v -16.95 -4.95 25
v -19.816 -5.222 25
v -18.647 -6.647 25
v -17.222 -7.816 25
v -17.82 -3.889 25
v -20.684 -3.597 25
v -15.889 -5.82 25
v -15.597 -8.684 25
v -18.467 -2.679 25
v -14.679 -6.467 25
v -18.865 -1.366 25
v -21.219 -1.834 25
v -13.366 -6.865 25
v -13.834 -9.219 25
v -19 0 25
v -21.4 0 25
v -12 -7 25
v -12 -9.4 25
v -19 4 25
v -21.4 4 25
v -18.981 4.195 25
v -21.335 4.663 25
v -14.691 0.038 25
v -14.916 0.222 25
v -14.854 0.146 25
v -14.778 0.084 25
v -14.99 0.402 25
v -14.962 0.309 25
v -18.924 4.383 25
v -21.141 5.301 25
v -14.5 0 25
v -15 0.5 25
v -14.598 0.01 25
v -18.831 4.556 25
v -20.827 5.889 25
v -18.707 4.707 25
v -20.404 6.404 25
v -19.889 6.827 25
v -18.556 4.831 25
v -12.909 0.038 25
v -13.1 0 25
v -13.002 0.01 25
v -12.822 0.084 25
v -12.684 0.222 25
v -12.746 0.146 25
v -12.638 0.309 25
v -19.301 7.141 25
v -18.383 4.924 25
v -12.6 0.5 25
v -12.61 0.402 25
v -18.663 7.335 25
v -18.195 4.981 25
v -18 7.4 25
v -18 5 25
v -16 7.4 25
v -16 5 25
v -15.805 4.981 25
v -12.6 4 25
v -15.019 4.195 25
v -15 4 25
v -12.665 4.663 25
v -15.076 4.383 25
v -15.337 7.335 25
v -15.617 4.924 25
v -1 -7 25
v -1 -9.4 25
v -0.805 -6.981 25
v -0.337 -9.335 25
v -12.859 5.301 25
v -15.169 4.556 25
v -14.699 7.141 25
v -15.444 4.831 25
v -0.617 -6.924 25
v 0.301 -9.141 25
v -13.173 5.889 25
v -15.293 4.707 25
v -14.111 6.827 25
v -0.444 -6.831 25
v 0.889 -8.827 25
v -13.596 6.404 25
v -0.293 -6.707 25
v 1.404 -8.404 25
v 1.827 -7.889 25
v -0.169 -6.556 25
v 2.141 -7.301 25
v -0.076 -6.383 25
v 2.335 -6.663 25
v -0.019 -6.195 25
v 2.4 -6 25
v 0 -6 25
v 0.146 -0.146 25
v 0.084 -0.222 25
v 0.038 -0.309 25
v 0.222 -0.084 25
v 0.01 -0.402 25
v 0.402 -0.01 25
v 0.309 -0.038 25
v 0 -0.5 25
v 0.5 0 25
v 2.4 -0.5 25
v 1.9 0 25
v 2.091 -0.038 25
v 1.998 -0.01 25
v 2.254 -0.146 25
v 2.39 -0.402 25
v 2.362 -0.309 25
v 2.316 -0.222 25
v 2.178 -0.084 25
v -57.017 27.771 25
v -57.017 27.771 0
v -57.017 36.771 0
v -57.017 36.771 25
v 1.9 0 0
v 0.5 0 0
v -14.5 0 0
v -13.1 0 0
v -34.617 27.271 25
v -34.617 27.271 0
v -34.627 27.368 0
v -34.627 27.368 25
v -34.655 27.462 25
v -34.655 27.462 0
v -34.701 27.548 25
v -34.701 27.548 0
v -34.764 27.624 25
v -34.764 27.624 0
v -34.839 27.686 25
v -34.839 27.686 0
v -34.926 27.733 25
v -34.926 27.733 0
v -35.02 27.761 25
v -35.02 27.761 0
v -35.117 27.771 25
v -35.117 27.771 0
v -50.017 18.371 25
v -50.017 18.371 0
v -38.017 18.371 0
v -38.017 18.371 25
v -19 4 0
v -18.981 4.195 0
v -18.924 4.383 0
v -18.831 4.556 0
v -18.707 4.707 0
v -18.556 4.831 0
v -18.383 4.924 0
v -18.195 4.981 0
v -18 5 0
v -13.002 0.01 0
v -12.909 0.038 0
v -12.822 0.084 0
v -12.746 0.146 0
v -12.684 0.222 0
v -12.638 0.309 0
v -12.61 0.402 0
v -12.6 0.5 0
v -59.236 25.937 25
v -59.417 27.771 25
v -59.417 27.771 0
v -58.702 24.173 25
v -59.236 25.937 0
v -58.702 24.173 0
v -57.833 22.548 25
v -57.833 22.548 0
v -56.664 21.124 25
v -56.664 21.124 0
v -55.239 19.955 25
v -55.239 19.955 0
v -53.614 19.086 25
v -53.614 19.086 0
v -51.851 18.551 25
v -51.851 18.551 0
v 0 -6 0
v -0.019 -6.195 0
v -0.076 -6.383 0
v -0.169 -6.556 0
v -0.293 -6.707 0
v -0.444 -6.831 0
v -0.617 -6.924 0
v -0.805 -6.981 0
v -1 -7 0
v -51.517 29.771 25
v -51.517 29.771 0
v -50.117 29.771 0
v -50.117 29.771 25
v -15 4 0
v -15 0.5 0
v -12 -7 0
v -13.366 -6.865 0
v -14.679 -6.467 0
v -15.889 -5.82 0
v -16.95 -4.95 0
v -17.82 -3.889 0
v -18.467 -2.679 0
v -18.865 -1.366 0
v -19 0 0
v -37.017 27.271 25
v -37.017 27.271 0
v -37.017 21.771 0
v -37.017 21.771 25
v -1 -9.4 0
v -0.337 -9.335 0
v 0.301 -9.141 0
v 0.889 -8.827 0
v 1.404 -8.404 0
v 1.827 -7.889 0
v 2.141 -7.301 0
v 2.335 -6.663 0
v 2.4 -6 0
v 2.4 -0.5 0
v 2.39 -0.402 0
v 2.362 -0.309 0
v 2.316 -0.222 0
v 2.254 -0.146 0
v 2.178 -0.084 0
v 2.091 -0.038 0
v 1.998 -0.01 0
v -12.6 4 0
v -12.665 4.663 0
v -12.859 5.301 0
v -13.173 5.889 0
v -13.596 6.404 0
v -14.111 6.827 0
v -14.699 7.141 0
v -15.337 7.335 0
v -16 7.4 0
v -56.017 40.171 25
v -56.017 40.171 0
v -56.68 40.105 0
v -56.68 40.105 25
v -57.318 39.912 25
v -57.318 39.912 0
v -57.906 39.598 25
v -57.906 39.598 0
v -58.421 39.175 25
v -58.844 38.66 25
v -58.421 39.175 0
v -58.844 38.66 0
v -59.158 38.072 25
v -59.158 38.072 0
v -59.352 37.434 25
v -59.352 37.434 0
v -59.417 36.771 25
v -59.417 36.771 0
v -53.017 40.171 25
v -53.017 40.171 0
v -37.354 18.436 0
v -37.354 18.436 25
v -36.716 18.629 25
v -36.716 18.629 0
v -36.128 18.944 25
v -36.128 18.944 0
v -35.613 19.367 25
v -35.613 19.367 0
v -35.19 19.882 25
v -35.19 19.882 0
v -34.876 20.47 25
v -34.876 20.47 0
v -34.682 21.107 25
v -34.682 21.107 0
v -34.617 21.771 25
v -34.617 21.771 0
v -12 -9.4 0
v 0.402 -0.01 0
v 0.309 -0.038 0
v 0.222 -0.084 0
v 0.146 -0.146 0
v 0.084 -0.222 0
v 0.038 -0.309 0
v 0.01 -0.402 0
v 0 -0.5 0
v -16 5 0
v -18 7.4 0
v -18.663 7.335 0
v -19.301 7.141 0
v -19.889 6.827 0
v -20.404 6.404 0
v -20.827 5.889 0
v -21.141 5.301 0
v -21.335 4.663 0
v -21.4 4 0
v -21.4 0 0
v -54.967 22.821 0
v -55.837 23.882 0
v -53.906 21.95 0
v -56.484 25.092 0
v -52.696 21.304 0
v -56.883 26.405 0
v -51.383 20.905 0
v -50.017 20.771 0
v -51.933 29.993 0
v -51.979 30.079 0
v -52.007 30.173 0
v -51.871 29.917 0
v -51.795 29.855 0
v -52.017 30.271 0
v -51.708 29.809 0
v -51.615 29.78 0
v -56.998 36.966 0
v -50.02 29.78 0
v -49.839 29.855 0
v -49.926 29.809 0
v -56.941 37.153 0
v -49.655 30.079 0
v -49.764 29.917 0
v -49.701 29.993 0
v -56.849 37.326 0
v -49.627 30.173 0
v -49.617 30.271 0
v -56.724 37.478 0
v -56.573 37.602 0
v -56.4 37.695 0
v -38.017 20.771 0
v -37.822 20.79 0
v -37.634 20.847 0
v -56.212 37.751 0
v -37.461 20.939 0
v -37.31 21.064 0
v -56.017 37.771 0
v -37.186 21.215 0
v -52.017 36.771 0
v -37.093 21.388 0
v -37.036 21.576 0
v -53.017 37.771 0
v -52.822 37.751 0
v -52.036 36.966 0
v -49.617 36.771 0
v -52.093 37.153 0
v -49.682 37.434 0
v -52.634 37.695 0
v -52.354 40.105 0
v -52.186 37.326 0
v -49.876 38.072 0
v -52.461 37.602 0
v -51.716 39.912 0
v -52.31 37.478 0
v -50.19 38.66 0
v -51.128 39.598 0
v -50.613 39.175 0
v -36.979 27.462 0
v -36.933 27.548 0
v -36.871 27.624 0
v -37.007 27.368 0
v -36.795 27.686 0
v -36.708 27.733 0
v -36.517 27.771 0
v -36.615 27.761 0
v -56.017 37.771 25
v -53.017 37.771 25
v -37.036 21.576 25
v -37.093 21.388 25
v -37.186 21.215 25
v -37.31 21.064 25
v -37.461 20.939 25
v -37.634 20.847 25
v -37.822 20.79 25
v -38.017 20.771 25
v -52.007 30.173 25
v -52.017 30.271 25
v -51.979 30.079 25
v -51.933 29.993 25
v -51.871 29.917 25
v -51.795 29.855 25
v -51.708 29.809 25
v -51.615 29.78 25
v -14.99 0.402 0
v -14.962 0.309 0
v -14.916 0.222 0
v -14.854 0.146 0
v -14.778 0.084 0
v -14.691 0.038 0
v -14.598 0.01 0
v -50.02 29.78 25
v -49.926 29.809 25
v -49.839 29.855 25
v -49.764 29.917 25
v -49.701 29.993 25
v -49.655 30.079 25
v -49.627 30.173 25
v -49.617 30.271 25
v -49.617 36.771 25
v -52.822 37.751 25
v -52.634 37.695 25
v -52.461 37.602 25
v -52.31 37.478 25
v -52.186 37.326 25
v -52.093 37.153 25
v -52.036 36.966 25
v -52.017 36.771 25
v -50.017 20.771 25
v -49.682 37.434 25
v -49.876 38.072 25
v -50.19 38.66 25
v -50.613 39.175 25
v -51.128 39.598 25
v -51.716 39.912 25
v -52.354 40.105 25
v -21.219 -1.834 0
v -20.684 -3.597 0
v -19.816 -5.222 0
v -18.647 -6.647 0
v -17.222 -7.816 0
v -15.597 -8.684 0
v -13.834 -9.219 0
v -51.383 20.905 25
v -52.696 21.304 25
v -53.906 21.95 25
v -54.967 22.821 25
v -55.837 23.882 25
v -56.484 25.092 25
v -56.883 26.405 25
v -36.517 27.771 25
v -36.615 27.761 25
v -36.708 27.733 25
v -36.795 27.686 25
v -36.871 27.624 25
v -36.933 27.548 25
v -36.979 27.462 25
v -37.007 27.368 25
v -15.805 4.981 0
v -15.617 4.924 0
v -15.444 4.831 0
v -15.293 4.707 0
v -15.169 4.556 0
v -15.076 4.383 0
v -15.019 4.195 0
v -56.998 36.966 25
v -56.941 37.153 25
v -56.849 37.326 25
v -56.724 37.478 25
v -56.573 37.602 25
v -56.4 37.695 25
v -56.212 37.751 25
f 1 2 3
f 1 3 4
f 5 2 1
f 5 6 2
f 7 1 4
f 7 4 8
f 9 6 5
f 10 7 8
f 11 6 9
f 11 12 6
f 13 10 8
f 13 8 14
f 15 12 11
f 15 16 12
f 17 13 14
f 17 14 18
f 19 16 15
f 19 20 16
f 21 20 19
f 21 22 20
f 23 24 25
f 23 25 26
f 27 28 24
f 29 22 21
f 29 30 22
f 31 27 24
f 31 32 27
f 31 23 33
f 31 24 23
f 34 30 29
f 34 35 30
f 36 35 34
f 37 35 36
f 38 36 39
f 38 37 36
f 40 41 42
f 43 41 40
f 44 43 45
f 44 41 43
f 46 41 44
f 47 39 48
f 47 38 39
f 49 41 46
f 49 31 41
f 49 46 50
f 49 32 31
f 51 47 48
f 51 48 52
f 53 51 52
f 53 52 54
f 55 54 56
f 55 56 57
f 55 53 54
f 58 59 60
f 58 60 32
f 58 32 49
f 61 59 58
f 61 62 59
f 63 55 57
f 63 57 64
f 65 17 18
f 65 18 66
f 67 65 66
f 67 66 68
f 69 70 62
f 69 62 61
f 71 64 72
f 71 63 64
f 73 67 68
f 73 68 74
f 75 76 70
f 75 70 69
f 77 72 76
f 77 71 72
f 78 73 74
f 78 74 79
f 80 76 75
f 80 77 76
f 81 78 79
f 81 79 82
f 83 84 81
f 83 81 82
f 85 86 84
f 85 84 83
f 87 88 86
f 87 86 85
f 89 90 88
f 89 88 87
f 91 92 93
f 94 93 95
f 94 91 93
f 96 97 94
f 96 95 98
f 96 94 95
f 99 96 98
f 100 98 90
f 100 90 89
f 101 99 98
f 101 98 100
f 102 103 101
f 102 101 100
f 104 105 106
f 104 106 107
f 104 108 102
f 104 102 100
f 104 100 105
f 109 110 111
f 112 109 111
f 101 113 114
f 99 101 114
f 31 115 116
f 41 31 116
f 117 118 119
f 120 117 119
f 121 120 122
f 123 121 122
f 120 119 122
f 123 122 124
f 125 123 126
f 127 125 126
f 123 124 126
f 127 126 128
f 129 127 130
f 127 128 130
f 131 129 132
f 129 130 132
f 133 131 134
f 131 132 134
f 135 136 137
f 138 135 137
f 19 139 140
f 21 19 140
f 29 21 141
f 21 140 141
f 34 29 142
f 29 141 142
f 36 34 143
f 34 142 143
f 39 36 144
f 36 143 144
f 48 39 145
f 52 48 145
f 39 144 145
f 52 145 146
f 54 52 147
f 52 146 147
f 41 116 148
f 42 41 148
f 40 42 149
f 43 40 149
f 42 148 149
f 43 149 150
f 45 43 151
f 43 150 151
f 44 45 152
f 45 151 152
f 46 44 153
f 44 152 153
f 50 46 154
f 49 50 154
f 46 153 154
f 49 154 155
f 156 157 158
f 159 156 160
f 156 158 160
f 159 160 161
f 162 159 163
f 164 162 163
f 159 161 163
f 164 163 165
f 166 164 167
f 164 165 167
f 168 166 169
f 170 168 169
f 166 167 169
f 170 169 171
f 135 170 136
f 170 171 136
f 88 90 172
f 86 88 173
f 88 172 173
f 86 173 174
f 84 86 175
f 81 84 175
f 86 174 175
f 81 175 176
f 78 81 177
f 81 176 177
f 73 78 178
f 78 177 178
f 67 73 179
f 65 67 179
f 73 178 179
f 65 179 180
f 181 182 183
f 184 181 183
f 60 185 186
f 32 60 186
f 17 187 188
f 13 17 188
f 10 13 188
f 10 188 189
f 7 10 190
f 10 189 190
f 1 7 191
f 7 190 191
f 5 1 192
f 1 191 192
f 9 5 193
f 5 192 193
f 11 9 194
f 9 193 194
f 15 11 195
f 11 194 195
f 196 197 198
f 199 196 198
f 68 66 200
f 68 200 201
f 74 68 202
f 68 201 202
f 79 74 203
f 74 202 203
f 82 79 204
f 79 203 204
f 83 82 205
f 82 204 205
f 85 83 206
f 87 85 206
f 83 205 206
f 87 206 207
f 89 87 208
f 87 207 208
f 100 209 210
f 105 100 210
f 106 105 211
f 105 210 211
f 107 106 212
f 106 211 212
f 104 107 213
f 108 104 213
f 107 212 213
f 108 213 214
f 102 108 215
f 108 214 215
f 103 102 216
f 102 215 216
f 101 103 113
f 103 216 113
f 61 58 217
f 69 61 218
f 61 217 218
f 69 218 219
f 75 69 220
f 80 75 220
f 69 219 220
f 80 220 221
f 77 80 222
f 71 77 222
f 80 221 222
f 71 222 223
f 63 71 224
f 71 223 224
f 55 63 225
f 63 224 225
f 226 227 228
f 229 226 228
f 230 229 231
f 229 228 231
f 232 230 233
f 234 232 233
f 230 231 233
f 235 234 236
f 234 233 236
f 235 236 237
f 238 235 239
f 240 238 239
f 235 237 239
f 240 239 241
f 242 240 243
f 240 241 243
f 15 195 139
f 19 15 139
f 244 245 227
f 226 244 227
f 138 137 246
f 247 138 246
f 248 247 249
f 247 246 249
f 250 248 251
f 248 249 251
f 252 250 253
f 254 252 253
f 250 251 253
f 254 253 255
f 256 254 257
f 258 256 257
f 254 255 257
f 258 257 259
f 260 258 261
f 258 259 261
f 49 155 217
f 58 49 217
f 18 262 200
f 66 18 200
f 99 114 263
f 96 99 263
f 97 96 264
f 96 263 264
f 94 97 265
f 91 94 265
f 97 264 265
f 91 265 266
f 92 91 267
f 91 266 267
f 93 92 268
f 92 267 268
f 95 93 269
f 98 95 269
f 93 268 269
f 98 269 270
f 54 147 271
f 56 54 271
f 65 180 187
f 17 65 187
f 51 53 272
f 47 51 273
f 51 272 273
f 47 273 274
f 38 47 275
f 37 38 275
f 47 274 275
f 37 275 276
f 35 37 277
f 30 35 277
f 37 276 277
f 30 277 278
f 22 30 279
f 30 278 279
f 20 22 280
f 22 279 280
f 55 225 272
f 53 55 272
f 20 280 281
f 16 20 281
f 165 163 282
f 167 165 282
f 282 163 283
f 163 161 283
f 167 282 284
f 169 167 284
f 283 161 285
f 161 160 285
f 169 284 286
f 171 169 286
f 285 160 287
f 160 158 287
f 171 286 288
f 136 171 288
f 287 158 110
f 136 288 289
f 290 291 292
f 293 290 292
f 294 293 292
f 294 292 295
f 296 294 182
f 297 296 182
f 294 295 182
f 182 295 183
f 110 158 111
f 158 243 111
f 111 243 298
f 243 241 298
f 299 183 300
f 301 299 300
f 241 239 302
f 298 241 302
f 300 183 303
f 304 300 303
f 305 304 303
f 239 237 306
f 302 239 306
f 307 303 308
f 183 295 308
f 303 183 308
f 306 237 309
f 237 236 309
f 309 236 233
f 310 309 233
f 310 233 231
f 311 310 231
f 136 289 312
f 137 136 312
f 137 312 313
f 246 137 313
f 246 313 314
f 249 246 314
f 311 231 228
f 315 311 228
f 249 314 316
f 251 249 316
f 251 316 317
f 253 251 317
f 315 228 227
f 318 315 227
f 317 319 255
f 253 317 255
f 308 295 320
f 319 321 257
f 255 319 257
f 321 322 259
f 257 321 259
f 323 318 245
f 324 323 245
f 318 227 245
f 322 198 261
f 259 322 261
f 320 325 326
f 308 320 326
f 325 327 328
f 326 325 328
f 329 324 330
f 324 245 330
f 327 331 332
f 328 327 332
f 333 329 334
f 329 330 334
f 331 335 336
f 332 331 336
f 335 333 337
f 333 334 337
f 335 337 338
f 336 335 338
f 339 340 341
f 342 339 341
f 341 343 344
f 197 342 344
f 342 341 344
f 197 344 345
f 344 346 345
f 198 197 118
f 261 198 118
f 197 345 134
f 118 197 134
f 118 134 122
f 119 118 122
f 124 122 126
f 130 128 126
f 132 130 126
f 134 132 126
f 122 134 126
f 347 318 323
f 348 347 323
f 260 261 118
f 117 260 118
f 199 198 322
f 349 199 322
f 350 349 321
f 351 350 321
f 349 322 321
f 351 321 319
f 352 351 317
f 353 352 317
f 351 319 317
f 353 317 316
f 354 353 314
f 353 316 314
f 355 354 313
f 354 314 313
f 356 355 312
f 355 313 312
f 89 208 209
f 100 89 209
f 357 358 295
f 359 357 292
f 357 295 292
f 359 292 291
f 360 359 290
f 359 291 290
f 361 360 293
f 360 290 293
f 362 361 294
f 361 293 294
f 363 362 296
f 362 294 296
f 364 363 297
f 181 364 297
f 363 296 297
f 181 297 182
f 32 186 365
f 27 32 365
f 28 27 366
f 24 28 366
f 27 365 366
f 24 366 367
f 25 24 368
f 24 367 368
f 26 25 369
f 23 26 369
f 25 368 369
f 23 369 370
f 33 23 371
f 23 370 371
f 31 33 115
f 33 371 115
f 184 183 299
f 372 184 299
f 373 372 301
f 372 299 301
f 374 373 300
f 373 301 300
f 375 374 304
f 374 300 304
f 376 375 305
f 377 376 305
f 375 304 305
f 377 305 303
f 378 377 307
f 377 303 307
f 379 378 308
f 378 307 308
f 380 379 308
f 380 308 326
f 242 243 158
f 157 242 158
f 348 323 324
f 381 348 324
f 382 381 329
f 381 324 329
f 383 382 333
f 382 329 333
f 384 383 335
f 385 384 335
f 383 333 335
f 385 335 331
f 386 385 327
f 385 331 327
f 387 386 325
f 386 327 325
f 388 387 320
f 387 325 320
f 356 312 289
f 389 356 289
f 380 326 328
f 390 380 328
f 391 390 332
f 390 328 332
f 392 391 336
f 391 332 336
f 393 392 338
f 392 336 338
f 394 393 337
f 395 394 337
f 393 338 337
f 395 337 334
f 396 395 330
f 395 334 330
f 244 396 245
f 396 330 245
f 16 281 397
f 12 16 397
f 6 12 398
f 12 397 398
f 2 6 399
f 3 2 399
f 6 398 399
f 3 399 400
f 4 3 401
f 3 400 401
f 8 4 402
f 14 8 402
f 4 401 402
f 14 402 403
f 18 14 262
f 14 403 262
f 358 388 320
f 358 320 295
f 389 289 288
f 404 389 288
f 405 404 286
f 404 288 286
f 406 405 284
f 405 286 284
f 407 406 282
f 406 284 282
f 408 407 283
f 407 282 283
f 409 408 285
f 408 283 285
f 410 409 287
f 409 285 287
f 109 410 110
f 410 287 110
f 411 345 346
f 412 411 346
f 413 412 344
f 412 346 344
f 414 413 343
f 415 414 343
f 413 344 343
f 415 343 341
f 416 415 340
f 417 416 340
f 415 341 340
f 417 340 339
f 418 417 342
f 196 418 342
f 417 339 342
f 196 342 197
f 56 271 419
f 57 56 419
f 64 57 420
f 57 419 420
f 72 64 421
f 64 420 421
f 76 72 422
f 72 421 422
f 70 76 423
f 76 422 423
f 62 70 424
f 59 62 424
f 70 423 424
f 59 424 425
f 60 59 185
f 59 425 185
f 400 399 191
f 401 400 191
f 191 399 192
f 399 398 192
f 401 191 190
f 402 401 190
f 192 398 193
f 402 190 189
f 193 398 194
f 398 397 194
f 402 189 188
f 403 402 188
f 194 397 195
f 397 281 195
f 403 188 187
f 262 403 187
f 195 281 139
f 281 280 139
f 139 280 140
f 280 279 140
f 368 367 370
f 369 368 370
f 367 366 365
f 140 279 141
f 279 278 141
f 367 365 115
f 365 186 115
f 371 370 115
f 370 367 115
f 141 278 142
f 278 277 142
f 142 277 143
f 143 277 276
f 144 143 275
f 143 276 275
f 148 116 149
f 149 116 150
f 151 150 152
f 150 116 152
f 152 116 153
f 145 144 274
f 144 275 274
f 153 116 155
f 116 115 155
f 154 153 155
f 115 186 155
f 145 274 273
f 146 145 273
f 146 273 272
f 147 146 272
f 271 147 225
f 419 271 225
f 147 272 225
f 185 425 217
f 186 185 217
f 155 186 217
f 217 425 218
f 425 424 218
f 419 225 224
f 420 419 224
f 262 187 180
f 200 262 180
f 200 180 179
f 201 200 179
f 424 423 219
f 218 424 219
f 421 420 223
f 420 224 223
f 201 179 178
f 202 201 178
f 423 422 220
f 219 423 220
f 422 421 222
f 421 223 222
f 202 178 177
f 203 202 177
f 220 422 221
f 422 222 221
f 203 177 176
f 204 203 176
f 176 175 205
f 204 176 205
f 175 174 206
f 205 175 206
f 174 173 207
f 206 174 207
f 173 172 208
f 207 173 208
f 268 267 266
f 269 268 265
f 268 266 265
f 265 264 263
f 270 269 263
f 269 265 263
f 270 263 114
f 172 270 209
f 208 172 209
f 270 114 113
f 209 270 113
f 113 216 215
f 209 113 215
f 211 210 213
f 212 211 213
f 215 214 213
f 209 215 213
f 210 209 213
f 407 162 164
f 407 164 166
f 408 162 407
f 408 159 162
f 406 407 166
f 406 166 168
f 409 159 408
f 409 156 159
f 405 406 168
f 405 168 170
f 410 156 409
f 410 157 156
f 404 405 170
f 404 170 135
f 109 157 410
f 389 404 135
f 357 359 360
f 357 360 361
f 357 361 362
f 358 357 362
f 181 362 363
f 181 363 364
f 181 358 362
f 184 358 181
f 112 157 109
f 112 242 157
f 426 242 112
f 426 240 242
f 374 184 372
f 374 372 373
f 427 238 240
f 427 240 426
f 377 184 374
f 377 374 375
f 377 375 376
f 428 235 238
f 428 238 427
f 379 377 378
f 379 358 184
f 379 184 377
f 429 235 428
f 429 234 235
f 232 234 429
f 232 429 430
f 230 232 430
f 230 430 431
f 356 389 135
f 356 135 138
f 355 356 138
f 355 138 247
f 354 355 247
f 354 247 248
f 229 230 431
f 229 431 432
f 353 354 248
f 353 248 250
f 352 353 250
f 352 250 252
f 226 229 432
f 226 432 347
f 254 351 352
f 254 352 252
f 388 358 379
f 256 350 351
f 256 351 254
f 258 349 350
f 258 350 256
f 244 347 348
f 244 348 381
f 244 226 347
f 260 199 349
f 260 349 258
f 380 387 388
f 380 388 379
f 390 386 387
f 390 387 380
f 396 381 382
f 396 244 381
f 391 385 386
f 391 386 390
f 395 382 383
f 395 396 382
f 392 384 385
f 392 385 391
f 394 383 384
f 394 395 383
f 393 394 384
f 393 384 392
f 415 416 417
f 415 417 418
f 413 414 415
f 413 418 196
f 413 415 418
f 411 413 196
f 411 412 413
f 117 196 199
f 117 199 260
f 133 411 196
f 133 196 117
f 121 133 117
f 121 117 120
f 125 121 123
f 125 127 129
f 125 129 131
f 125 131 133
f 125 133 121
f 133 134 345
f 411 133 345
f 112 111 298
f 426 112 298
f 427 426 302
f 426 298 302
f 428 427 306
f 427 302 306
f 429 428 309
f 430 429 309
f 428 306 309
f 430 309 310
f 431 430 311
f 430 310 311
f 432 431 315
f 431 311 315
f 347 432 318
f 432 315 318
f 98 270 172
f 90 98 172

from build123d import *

# Parameters (mm, degrees)
F2_DEPTH = 25


with BuildPart() as f2:
    # F0 (on Top) + F1 (on Top) → F2 (new body)
    with BuildSketch(Plane.XY):
        with BuildLine():
            ThreePointArc((0.5, 0), (0.146447, -0.146447), (0, -0.5))
            Line((0, -0.5), (0, -6))
            ThreePointArc((0, -6), (-0.292893, -6.707107), (-1, -7))
            Line((-1, -7), (-12, -7))
            ThreePointArc((-12, -7), (-16.949747, -4.949747), (-19, 0))
            Line((-19, 0), (-19, 4))
            ThreePointArc((-19, 4), (-18.707107, 4.707107), (-18, 5))
            Line((-18, 5), (-16, 5))
            ThreePointArc((-16, 5), (-15.292893, 4.707107), (-15, 4))
            Line((-15, 4), (-15, 0.5))
            ThreePointArc((-15, 0.5), (-14.853553, 0.146447), (-14.5, 0))
            Line((-14.5, 0), (-13.1, 0))
            ThreePointArc((-13.1, 0), (-12.746447, 0.146447), (-12.6, 0.5))
            Line((-12.6, 0.5), (-12.6, 4))
            ThreePointArc((-12.6, 4), (-13.595837, 6.404163), (-16, 7.4))
            Line((-16, 7.4), (-18, 7.4))
            ThreePointArc((-18, 7.4), (-20.404163, 6.404163), (-21.4, 4))
            Line((-21.4, 4), (-21.4, 0))
            ThreePointArc((-21.4, 0), (-18.646804, -6.646804), (-12, -9.4))
            Line((-12, -9.4), (-1, -9.4))
            ThreePointArc((-1, -9.4), (1.404163, -8.404163), (2.4, -6))
            Line((2.4, -6), (2.4, -0.5))
            ThreePointArc((2.4, -0.5), (2.253553, -0.146447), (1.9, 0))
            Line((1.9, 0), (0.5, 0))
        make_face()
    with BuildSketch(Plane.XY):
        with BuildLine():
            ThreePointArc((-36.517058, 27.770684), (-36.870612, 27.624237), (-37.017058, 27.270684))
            Line((-37.017058, 27.270684), (-37.017058, 21.770684))
            ThreePointArc((-37.017058, 21.770684), (-37.309951, 21.063577), (-38.017058, 20.770684))
            Line((-38.017058, 20.770684), (-50.017058, 20.770684))
            ThreePointArc((-50.017058, 20.770684), (-54.966806, 22.820937), (-57.017058, 27.770684))
            Line((-57.017058, 27.770684), (-57.017058, 36.770684))
            ThreePointArc((-57.017058, 36.770684), (-56.724165, 37.477791), (-56.017058, 37.770684))
            Line((-56.017058, 37.770684), (-53.017058, 37.770684))
            ThreePointArc((-53.017058, 37.770684), (-52.309951, 37.477791), (-52.017058, 36.770684))
            Line((-52.017058, 36.770684), (-52.017058, 30.270684))
            ThreePointArc((-52.017058, 30.270684), (-51.870612, 29.917131), (-51.517058, 29.770684))
            Line((-51.517058, 29.770684), (-50.117058, 29.770684))
            ThreePointArc((-50.117058, 29.770684), (-49.763505, 29.917131), (-49.617058, 30.270684))
            Line((-49.617058, 30.270684), (-49.617058, 36.770684))
            ThreePointArc((-49.617058, 36.770684), (-50.612895, 39.174847), (-53.017058, 40.170684))
            Line((-53.017058, 40.170684), (-56.017058, 40.170684))
            ThreePointArc((-56.017058, 40.170684), (-58.421221, 39.174847), (-59.417058, 36.770684))
            Line((-59.417058, 36.770684), (-59.417058, 27.770684))
            ThreePointArc((-59.417058, 27.770684), (-56.663862, 21.12388), (-50.017058, 18.370684))
            Line((-50.017058, 18.370684), (-38.017058, 18.370684))
            ThreePointArc((-38.017058, 18.370684), (-35.612895, 19.366521), (-34.617058, 21.770684))
            Line((-34.617058, 21.770684), (-34.617058, 27.270684))
            ThreePointArc((-34.617058, 27.270684), (-34.763505, 27.624237), (-35.117058, 27.770684))
            Line((-35.117058, 27.770684), (-36.517058, 27.770684))
        make_face()
    extrude(amount=F2_DEPTH)


solid = f2.part
